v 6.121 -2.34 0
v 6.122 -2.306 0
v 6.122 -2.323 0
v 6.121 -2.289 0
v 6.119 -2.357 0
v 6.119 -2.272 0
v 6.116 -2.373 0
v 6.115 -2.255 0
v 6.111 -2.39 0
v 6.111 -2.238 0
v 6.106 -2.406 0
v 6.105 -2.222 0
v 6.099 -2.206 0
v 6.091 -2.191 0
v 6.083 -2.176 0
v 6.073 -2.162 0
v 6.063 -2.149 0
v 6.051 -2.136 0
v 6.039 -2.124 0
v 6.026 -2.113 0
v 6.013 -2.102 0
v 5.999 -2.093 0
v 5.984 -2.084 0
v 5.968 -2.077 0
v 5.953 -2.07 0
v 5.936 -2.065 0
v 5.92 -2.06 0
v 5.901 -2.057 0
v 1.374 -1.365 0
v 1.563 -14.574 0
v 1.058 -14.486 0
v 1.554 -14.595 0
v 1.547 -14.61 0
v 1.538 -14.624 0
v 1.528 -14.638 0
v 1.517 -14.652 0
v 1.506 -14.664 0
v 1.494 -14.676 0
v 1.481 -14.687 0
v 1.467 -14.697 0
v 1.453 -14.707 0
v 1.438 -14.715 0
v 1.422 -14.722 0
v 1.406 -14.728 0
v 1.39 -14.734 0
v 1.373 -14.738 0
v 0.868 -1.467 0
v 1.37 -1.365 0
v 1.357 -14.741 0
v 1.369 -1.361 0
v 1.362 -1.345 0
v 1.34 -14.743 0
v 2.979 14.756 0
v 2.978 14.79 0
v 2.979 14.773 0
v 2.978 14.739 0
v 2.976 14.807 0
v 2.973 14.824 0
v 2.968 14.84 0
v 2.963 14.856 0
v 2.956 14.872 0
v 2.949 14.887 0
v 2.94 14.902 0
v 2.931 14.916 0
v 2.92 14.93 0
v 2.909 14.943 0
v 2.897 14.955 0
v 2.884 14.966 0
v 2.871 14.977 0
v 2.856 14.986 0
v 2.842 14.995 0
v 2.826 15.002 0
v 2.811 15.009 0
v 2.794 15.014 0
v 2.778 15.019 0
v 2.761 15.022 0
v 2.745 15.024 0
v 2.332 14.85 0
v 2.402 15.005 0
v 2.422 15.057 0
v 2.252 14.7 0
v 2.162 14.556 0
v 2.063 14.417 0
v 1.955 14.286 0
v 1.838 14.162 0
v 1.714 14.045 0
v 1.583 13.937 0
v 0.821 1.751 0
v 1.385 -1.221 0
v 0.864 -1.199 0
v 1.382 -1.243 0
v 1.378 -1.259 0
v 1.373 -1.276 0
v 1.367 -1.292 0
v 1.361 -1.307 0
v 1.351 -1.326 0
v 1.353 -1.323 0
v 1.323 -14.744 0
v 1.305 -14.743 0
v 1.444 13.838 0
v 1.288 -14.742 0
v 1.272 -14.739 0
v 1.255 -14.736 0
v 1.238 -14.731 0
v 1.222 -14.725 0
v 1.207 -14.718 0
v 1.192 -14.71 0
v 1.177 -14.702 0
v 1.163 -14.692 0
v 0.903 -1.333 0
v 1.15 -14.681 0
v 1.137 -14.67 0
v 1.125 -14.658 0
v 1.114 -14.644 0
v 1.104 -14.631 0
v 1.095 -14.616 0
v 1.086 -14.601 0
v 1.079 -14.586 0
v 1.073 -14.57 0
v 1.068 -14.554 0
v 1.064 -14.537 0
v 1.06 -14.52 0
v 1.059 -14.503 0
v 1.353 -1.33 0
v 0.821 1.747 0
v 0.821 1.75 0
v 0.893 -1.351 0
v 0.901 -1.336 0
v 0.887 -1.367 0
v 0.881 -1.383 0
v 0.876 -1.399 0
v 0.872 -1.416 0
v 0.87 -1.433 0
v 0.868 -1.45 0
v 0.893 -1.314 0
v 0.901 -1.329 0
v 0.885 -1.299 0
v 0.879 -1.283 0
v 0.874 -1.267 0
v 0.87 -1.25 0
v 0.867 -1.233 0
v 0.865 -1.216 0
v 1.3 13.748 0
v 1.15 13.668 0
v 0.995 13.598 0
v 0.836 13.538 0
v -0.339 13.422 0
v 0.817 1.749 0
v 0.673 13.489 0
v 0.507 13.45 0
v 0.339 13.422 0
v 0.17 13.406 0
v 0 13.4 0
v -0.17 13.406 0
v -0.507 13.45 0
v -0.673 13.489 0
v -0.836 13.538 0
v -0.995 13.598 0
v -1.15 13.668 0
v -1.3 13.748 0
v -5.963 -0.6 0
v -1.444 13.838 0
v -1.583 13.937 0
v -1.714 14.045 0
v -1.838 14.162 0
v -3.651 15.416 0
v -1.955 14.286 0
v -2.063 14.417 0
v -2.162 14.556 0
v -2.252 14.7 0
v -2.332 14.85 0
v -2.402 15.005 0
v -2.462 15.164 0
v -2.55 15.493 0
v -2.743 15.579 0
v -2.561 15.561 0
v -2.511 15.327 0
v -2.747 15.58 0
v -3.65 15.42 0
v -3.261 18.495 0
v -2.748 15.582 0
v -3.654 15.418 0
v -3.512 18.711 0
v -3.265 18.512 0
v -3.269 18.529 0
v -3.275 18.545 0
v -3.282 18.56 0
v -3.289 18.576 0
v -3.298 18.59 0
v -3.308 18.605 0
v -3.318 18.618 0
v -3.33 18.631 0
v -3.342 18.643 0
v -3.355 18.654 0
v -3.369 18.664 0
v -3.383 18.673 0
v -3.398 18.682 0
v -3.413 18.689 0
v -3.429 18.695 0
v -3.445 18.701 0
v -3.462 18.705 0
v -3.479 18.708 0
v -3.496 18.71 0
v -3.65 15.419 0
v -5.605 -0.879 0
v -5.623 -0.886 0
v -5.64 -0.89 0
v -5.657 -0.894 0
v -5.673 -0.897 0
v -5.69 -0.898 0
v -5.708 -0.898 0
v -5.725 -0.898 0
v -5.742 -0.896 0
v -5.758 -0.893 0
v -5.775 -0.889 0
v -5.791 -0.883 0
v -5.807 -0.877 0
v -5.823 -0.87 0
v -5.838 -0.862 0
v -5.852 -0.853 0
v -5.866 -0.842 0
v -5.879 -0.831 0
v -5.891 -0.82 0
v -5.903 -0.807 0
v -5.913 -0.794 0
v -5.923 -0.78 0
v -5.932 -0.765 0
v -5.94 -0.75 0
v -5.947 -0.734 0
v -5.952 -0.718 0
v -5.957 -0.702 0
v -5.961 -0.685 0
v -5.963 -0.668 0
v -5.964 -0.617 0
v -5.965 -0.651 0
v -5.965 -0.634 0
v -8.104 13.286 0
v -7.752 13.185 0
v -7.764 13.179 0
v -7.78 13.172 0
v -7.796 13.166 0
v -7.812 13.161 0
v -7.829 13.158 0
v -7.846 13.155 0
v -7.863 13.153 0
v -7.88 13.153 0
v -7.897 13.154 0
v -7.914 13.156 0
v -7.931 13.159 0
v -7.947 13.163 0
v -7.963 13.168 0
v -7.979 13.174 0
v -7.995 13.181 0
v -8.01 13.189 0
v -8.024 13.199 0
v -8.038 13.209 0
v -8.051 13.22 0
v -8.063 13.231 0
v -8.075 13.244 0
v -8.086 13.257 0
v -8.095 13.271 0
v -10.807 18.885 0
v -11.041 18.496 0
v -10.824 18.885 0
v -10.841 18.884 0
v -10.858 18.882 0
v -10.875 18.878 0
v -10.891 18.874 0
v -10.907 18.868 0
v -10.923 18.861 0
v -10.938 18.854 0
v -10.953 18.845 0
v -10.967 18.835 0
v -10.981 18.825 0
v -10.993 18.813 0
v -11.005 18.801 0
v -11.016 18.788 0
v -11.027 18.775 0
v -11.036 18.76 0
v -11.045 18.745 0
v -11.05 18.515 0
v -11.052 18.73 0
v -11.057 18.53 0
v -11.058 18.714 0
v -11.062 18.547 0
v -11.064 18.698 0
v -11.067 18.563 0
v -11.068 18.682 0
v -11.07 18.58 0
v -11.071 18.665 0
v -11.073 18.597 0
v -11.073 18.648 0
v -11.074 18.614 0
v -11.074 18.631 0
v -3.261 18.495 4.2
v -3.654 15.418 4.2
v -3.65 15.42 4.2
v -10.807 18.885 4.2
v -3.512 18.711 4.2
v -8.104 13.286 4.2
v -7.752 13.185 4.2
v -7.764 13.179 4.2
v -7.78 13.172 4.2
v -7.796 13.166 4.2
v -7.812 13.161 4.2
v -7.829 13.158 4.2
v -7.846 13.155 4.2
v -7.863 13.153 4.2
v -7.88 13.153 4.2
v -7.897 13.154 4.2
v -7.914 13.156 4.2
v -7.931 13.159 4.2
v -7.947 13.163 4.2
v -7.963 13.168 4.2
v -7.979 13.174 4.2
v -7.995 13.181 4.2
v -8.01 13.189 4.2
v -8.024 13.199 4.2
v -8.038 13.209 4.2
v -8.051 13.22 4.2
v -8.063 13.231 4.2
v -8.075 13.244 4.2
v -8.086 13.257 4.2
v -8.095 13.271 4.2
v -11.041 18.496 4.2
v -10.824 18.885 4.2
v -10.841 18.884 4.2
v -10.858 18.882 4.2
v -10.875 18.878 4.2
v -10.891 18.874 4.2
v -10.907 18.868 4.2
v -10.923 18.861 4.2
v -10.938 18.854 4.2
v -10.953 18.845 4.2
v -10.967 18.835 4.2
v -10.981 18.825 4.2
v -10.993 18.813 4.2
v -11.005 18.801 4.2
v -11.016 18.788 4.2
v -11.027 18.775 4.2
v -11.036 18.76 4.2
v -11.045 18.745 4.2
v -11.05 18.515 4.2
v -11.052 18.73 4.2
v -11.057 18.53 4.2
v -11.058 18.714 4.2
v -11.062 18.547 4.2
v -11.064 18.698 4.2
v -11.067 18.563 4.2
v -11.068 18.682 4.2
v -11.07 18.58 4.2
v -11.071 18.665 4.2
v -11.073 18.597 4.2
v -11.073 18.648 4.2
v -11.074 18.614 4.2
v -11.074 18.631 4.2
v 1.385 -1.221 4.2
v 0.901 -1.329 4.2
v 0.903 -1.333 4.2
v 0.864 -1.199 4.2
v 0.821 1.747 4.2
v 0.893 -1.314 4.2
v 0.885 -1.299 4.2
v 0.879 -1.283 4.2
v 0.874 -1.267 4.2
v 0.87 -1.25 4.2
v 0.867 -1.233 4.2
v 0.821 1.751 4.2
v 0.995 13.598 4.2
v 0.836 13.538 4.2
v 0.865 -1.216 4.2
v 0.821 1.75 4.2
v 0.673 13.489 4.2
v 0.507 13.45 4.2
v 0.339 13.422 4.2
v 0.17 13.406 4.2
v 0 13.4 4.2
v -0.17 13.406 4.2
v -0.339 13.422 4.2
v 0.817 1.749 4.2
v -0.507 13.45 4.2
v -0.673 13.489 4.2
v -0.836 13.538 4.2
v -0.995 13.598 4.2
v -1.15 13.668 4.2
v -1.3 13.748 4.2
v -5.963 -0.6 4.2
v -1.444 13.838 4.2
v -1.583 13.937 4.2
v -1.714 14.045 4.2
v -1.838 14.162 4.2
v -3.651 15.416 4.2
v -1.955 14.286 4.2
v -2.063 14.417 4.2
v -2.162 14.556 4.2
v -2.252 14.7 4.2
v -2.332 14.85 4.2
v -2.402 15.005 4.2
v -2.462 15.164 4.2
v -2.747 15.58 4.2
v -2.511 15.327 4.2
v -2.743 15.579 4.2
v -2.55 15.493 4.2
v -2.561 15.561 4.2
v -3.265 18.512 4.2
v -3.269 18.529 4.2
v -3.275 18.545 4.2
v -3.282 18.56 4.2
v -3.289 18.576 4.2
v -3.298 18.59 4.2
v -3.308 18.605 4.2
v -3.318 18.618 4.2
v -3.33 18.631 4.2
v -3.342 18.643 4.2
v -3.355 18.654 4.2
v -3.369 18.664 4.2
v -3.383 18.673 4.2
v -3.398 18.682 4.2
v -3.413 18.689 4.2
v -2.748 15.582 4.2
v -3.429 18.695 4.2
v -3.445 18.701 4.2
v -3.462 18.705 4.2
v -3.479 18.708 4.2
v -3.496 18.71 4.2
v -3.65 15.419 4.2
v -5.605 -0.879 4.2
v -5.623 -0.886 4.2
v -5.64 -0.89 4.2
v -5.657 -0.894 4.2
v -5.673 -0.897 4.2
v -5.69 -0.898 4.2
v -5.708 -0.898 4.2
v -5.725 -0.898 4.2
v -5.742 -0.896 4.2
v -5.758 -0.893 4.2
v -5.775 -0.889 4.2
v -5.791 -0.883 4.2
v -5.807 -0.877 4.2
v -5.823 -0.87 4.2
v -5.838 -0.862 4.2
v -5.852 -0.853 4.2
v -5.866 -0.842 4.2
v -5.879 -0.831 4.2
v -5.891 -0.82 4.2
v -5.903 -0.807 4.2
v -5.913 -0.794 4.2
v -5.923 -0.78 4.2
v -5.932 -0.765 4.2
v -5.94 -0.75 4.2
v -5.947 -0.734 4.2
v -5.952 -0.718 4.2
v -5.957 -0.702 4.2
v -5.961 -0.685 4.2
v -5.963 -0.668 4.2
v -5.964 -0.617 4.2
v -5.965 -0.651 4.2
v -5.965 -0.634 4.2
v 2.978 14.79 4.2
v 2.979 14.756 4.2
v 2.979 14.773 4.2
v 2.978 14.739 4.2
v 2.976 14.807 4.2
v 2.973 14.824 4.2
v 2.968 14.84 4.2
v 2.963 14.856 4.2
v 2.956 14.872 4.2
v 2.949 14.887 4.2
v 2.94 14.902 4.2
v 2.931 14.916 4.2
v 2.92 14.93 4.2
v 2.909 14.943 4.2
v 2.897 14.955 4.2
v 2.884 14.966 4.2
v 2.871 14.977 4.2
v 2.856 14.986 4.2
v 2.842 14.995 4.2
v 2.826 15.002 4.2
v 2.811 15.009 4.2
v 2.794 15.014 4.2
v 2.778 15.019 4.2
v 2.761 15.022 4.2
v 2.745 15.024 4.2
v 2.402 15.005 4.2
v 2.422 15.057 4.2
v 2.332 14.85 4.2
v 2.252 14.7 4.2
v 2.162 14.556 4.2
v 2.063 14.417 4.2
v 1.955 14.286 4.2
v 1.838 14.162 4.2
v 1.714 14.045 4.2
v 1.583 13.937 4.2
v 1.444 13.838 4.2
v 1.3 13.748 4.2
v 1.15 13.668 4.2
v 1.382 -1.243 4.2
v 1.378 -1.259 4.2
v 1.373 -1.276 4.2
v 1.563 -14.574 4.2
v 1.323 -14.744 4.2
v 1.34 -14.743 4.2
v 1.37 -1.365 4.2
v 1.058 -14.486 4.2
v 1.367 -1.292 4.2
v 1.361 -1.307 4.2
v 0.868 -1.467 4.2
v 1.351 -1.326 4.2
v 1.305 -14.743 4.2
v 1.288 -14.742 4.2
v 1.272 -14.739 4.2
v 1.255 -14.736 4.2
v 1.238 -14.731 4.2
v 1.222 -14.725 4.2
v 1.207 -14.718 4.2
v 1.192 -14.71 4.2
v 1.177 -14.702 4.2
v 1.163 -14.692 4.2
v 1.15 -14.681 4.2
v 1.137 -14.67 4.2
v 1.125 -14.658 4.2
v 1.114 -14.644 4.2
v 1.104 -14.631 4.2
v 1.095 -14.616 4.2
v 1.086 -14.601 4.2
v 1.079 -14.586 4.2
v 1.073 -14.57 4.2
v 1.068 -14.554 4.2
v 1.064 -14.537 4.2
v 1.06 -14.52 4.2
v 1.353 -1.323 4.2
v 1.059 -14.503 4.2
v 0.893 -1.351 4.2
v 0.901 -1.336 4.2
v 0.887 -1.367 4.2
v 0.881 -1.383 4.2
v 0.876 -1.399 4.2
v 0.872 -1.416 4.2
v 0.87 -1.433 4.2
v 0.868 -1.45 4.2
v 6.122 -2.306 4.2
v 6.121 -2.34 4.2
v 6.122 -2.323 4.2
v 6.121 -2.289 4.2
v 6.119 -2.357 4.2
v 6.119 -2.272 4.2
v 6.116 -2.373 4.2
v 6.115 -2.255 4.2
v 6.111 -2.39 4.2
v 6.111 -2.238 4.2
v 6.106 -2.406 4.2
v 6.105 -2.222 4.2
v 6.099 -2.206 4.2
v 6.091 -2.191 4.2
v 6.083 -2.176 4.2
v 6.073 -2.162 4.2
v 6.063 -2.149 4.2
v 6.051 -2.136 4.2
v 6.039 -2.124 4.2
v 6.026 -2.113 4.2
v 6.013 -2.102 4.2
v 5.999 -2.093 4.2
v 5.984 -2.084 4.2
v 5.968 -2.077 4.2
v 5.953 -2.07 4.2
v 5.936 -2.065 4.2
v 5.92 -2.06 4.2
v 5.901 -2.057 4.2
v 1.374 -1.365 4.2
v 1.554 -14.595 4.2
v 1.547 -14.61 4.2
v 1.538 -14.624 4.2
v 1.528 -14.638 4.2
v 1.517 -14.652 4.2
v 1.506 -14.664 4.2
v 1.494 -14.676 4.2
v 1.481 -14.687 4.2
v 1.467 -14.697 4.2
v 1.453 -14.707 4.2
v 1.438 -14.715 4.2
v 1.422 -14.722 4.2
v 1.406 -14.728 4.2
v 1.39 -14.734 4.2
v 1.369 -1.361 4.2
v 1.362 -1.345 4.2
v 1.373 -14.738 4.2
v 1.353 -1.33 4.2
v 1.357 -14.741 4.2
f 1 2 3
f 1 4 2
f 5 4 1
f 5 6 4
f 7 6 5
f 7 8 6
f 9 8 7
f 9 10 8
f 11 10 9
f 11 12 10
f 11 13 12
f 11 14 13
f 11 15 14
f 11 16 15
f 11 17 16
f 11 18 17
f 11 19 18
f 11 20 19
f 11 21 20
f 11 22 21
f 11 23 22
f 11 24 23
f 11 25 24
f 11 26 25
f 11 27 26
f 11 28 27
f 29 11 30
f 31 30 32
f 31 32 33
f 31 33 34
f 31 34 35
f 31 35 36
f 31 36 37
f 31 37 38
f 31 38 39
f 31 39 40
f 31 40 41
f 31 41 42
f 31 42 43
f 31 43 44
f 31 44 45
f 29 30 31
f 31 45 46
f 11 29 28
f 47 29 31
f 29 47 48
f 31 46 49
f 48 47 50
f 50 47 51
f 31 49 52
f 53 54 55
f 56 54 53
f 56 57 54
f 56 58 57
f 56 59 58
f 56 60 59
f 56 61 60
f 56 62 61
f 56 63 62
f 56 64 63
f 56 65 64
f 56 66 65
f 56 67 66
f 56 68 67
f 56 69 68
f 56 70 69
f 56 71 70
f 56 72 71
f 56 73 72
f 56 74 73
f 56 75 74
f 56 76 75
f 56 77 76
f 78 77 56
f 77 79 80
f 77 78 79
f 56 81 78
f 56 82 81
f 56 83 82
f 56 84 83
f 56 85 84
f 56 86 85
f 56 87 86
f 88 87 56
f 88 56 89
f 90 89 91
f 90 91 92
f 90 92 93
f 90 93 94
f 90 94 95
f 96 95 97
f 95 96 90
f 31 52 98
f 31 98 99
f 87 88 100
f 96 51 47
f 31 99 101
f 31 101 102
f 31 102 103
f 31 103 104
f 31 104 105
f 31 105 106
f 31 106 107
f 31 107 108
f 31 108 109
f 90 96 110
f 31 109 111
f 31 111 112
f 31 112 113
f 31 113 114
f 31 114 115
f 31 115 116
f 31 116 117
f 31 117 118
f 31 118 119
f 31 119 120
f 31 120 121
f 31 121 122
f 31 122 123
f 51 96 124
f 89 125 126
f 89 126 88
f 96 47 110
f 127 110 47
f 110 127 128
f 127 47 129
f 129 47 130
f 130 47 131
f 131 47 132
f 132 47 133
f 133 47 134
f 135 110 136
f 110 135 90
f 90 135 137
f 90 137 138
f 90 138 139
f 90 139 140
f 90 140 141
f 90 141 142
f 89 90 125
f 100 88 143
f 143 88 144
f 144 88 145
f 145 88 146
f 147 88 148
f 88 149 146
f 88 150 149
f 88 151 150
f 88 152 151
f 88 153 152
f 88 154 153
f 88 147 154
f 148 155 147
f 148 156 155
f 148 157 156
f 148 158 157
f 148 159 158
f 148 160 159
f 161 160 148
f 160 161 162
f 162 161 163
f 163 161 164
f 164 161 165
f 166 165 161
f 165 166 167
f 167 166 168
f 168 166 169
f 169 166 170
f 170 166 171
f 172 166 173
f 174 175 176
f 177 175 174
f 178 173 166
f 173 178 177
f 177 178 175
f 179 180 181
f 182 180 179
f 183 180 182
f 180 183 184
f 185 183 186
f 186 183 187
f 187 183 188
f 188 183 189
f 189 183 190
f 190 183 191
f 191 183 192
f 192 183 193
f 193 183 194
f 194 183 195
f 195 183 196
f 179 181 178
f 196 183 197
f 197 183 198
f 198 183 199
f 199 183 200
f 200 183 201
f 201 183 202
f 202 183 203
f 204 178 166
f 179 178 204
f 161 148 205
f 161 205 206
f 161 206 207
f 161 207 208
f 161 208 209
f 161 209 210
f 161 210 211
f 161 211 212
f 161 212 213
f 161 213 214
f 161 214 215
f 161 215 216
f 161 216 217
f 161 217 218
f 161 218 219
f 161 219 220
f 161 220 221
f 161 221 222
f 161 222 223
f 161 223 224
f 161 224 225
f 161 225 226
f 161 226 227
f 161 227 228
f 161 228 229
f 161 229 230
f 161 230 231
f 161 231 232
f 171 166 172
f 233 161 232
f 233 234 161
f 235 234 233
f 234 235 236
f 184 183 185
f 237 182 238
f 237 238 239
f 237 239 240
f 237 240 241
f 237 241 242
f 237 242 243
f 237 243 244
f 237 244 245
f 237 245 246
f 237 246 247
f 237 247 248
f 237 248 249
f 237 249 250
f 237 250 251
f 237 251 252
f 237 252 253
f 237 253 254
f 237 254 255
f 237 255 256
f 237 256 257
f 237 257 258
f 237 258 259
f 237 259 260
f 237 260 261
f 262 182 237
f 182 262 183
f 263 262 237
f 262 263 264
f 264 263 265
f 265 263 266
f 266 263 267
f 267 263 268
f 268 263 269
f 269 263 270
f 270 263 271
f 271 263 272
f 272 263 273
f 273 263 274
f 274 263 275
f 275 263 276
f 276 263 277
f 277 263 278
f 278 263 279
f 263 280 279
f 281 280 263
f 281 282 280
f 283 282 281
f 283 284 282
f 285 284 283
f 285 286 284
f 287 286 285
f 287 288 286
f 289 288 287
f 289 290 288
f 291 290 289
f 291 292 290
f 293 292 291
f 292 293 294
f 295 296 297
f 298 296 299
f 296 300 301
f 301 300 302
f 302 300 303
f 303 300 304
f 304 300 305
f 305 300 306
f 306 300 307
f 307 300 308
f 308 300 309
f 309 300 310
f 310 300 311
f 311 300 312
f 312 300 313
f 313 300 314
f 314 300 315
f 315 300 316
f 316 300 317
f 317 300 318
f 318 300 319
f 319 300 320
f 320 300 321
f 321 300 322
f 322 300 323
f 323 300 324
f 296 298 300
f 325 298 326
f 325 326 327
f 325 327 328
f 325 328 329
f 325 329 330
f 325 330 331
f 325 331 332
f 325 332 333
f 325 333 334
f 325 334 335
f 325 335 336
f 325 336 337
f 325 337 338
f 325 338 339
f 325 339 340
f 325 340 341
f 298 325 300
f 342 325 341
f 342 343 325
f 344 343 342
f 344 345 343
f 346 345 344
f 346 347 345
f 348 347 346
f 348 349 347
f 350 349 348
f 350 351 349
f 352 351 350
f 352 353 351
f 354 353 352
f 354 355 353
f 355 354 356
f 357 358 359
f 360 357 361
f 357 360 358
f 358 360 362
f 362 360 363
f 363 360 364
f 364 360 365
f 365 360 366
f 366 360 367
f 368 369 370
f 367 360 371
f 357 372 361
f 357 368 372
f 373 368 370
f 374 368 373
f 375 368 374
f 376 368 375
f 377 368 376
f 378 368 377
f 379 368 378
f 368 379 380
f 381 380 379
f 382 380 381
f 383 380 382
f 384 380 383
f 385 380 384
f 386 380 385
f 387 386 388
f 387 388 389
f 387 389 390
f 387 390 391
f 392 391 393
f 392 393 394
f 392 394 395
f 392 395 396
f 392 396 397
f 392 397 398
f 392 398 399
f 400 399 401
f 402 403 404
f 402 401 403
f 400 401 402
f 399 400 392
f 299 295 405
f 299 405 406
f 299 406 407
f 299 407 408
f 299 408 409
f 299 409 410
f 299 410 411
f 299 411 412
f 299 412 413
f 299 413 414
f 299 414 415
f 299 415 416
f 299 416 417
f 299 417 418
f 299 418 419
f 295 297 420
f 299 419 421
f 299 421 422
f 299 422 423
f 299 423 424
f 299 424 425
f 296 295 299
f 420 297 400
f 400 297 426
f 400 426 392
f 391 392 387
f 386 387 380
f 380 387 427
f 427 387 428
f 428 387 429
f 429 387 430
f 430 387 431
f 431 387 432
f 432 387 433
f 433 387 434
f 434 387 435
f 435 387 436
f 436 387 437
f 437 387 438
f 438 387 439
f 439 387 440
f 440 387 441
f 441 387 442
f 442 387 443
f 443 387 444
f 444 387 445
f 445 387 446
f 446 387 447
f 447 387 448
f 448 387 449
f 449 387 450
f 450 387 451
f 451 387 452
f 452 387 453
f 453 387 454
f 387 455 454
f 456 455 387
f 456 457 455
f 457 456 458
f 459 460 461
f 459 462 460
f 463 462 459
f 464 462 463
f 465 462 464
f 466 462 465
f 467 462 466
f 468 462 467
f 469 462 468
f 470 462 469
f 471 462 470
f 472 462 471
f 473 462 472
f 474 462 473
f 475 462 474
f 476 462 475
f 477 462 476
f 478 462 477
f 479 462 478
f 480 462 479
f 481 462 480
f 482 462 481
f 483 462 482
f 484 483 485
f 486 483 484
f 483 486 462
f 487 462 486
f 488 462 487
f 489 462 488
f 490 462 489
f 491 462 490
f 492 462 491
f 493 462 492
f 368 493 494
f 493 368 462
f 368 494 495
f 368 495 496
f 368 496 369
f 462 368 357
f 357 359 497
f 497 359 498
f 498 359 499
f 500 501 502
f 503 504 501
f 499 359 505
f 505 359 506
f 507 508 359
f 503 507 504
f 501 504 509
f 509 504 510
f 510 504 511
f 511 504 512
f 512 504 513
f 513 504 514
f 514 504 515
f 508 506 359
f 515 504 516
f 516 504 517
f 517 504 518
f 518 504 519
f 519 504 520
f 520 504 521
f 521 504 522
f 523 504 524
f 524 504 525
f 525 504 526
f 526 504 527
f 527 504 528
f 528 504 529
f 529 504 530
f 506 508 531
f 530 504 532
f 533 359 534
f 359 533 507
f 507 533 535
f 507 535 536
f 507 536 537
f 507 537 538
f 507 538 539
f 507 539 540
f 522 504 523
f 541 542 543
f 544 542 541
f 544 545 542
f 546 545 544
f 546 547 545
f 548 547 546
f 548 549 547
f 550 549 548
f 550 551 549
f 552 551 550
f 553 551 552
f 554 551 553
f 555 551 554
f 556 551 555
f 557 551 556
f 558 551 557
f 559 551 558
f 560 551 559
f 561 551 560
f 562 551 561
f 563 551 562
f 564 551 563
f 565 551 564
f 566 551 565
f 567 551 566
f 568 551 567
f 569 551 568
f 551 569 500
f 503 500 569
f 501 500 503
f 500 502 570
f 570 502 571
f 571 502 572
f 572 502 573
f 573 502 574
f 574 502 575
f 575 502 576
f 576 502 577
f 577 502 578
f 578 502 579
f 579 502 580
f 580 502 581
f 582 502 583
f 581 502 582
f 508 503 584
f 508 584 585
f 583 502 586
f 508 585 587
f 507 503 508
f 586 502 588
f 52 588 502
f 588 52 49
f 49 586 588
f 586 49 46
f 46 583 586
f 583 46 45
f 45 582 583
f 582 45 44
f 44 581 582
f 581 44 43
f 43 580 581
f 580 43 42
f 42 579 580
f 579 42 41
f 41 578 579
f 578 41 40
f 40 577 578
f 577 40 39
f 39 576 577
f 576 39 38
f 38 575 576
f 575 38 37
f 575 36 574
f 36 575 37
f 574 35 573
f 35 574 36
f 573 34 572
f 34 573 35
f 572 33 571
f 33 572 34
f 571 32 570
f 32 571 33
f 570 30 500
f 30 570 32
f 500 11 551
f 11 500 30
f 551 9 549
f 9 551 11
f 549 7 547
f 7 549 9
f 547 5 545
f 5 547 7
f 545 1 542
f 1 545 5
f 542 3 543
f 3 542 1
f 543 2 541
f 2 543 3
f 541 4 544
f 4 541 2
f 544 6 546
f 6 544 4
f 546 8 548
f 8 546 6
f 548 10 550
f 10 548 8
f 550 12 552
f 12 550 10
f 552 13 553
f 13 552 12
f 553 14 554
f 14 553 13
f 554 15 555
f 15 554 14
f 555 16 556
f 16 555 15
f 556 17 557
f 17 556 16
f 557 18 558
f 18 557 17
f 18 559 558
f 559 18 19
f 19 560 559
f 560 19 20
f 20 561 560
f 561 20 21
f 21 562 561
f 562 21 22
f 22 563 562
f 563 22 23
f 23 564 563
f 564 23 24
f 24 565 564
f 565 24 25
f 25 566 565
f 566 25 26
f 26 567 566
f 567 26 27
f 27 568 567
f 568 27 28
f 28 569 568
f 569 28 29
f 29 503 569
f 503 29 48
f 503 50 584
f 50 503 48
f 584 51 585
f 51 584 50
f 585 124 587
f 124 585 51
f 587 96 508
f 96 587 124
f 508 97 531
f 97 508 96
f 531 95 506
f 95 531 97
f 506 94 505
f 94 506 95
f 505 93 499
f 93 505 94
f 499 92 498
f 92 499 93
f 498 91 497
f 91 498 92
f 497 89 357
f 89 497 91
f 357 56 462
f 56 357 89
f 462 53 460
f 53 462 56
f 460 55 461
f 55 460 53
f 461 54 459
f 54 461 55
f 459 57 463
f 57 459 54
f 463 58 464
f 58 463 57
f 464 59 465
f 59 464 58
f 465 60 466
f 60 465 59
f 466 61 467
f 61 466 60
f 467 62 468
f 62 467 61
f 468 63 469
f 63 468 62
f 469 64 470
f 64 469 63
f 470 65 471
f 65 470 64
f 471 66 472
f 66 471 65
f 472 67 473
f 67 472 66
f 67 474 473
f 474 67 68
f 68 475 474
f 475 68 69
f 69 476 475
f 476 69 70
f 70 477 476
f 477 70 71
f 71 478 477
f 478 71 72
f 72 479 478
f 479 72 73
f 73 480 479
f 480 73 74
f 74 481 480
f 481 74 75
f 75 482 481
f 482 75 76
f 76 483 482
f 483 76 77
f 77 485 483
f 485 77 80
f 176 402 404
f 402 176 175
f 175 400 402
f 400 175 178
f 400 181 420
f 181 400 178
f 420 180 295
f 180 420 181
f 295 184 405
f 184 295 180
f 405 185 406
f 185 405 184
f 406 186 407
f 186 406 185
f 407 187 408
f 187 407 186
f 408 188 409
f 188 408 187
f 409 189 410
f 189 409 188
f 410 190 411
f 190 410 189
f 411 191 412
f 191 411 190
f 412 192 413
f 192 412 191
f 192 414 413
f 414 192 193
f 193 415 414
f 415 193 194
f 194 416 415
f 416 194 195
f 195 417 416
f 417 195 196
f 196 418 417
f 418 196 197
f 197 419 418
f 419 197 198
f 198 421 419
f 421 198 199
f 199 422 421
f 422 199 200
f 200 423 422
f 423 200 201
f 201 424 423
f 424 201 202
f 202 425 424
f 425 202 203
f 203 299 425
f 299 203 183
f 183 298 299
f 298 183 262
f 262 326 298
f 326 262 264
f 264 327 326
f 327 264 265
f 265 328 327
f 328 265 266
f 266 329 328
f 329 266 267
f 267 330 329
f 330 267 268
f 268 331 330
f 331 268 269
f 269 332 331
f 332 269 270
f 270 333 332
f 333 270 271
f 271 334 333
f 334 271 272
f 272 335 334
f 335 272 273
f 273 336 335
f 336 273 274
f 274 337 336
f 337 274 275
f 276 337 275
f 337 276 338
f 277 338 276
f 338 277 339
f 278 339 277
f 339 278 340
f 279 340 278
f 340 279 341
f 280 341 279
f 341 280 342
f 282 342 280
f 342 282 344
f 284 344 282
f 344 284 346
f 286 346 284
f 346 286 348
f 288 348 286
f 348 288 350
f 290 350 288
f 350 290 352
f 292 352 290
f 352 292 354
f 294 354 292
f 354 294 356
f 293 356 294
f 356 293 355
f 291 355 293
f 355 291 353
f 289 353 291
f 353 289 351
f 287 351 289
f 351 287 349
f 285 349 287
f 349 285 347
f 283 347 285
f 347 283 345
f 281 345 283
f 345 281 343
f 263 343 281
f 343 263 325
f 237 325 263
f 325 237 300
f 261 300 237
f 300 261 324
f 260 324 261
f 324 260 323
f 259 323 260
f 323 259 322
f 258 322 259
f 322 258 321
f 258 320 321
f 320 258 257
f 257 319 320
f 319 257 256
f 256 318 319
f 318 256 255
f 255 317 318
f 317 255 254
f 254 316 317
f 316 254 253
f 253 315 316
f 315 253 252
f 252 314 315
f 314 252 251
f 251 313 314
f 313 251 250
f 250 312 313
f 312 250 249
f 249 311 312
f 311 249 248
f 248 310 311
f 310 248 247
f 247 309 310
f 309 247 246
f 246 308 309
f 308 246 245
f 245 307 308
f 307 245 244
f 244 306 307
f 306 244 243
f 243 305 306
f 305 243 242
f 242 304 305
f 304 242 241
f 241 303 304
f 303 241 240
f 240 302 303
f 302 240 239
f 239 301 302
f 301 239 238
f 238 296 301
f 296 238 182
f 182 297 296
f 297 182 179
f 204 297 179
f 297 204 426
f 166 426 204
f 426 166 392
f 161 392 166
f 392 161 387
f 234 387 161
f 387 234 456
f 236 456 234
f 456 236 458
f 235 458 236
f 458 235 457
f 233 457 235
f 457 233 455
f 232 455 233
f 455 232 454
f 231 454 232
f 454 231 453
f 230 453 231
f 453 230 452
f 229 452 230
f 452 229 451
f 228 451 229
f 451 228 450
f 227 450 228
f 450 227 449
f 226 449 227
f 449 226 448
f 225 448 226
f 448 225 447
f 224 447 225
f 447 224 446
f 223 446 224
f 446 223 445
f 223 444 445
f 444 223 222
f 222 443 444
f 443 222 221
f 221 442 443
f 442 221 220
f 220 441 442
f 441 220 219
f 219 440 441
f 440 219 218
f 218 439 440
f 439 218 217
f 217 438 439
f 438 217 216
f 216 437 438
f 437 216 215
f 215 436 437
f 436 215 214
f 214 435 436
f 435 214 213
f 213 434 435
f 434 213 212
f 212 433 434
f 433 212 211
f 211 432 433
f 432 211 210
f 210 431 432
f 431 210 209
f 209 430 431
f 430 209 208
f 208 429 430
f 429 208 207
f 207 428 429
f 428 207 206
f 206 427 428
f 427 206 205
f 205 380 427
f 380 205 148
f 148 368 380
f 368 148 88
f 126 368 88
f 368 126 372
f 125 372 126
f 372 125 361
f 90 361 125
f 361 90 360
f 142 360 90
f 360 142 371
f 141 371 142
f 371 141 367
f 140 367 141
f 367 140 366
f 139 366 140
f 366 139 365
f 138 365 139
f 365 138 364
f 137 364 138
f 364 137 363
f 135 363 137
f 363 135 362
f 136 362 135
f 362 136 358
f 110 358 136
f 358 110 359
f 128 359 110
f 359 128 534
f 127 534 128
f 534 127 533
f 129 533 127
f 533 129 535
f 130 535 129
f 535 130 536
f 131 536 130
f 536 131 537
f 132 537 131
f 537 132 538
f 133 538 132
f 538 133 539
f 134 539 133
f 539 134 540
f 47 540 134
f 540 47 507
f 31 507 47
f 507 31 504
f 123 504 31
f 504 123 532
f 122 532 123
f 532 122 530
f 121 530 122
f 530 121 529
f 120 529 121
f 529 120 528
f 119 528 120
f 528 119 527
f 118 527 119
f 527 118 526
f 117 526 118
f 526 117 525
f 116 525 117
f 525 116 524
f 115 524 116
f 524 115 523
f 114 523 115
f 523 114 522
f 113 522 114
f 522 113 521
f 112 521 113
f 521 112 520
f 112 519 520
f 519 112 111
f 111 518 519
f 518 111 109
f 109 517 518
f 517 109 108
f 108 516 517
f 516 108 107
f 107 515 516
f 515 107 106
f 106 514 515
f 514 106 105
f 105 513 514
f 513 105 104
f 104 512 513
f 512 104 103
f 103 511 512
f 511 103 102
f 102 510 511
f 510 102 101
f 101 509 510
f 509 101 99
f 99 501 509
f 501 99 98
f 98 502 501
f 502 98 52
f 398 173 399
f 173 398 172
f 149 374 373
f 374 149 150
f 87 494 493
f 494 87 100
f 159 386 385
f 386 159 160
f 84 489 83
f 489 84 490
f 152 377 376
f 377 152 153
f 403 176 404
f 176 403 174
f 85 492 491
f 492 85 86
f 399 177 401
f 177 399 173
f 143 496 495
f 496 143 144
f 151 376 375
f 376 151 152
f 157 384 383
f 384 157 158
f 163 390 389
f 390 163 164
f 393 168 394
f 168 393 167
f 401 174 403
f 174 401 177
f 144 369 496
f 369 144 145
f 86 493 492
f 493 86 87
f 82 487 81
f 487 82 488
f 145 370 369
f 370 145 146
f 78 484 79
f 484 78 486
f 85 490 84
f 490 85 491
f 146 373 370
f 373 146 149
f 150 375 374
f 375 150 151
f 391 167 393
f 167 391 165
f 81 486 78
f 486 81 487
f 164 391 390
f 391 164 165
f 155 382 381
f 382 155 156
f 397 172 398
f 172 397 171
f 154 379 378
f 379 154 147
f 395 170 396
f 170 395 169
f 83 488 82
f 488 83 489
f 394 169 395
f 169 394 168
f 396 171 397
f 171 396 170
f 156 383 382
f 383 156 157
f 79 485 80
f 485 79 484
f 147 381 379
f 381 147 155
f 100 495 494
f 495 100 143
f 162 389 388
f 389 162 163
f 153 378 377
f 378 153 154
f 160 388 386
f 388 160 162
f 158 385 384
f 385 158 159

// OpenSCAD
$fn=96;
thickness_mm = 4.2;
pts = [[-7.978, 13.0617], [-3.6502, 15.4202], [-6.0278, -1.0518], [0.8209, 1.7511], [1.078, -15.8737], [6.2181, -2.1053], [1.3703, -1.3648], [3.0039, 14.9981], [-2.7471, 15.5794], [-3.2984, 18.706], [-11.2661, 18.8964]];
hole = [0.0, 16.0, 2.6];
offset_r = 0.261;
engrave_depth = 0.9;
module shape2d(){
  // CGAL clean + controlled smooth/sharp
  offset(r=offset_r) offset(r=-offset_r)
    polygon(points=pts, paths=[[for(i=[0:len(pts)-1]) i]]);
}
module body(){
  linear_extrude(height=thickness_mm, convexity=10)
    shape2d();
}
module face_engrave(){
  // eyes
  translate([6.5, 4.8, thickness_mm-engrave_depth]) cylinder(h=engrave_depth+0.2, r=2.8189);
  translate([-6.5, 4.8, thickness_mm-engrave_depth]) cylinder(h=engrave_depth+0.2, r=2.8189);

  // mouth arc band (2D ring section extruded shallow)
  translate([0, -5.5, thickness_mm-engrave_depth])
    linear_extrude(height=engrave_depth+0.2)
      intersection(){
        // limit width
        square([9.9325, 9.9325], center=true);
        difference(){
          translate([0,-5.5]) circle(r=13.1785);
          translate([0,-5.5]) circle(r=11.5785);
        }
      };
}
difference(){
  body();
  // keychain hole (exactly 1)
  translate([hole[0], hole[1], -1]) cylinder(h=thickness_mm+2, r=hole[2]);
}
